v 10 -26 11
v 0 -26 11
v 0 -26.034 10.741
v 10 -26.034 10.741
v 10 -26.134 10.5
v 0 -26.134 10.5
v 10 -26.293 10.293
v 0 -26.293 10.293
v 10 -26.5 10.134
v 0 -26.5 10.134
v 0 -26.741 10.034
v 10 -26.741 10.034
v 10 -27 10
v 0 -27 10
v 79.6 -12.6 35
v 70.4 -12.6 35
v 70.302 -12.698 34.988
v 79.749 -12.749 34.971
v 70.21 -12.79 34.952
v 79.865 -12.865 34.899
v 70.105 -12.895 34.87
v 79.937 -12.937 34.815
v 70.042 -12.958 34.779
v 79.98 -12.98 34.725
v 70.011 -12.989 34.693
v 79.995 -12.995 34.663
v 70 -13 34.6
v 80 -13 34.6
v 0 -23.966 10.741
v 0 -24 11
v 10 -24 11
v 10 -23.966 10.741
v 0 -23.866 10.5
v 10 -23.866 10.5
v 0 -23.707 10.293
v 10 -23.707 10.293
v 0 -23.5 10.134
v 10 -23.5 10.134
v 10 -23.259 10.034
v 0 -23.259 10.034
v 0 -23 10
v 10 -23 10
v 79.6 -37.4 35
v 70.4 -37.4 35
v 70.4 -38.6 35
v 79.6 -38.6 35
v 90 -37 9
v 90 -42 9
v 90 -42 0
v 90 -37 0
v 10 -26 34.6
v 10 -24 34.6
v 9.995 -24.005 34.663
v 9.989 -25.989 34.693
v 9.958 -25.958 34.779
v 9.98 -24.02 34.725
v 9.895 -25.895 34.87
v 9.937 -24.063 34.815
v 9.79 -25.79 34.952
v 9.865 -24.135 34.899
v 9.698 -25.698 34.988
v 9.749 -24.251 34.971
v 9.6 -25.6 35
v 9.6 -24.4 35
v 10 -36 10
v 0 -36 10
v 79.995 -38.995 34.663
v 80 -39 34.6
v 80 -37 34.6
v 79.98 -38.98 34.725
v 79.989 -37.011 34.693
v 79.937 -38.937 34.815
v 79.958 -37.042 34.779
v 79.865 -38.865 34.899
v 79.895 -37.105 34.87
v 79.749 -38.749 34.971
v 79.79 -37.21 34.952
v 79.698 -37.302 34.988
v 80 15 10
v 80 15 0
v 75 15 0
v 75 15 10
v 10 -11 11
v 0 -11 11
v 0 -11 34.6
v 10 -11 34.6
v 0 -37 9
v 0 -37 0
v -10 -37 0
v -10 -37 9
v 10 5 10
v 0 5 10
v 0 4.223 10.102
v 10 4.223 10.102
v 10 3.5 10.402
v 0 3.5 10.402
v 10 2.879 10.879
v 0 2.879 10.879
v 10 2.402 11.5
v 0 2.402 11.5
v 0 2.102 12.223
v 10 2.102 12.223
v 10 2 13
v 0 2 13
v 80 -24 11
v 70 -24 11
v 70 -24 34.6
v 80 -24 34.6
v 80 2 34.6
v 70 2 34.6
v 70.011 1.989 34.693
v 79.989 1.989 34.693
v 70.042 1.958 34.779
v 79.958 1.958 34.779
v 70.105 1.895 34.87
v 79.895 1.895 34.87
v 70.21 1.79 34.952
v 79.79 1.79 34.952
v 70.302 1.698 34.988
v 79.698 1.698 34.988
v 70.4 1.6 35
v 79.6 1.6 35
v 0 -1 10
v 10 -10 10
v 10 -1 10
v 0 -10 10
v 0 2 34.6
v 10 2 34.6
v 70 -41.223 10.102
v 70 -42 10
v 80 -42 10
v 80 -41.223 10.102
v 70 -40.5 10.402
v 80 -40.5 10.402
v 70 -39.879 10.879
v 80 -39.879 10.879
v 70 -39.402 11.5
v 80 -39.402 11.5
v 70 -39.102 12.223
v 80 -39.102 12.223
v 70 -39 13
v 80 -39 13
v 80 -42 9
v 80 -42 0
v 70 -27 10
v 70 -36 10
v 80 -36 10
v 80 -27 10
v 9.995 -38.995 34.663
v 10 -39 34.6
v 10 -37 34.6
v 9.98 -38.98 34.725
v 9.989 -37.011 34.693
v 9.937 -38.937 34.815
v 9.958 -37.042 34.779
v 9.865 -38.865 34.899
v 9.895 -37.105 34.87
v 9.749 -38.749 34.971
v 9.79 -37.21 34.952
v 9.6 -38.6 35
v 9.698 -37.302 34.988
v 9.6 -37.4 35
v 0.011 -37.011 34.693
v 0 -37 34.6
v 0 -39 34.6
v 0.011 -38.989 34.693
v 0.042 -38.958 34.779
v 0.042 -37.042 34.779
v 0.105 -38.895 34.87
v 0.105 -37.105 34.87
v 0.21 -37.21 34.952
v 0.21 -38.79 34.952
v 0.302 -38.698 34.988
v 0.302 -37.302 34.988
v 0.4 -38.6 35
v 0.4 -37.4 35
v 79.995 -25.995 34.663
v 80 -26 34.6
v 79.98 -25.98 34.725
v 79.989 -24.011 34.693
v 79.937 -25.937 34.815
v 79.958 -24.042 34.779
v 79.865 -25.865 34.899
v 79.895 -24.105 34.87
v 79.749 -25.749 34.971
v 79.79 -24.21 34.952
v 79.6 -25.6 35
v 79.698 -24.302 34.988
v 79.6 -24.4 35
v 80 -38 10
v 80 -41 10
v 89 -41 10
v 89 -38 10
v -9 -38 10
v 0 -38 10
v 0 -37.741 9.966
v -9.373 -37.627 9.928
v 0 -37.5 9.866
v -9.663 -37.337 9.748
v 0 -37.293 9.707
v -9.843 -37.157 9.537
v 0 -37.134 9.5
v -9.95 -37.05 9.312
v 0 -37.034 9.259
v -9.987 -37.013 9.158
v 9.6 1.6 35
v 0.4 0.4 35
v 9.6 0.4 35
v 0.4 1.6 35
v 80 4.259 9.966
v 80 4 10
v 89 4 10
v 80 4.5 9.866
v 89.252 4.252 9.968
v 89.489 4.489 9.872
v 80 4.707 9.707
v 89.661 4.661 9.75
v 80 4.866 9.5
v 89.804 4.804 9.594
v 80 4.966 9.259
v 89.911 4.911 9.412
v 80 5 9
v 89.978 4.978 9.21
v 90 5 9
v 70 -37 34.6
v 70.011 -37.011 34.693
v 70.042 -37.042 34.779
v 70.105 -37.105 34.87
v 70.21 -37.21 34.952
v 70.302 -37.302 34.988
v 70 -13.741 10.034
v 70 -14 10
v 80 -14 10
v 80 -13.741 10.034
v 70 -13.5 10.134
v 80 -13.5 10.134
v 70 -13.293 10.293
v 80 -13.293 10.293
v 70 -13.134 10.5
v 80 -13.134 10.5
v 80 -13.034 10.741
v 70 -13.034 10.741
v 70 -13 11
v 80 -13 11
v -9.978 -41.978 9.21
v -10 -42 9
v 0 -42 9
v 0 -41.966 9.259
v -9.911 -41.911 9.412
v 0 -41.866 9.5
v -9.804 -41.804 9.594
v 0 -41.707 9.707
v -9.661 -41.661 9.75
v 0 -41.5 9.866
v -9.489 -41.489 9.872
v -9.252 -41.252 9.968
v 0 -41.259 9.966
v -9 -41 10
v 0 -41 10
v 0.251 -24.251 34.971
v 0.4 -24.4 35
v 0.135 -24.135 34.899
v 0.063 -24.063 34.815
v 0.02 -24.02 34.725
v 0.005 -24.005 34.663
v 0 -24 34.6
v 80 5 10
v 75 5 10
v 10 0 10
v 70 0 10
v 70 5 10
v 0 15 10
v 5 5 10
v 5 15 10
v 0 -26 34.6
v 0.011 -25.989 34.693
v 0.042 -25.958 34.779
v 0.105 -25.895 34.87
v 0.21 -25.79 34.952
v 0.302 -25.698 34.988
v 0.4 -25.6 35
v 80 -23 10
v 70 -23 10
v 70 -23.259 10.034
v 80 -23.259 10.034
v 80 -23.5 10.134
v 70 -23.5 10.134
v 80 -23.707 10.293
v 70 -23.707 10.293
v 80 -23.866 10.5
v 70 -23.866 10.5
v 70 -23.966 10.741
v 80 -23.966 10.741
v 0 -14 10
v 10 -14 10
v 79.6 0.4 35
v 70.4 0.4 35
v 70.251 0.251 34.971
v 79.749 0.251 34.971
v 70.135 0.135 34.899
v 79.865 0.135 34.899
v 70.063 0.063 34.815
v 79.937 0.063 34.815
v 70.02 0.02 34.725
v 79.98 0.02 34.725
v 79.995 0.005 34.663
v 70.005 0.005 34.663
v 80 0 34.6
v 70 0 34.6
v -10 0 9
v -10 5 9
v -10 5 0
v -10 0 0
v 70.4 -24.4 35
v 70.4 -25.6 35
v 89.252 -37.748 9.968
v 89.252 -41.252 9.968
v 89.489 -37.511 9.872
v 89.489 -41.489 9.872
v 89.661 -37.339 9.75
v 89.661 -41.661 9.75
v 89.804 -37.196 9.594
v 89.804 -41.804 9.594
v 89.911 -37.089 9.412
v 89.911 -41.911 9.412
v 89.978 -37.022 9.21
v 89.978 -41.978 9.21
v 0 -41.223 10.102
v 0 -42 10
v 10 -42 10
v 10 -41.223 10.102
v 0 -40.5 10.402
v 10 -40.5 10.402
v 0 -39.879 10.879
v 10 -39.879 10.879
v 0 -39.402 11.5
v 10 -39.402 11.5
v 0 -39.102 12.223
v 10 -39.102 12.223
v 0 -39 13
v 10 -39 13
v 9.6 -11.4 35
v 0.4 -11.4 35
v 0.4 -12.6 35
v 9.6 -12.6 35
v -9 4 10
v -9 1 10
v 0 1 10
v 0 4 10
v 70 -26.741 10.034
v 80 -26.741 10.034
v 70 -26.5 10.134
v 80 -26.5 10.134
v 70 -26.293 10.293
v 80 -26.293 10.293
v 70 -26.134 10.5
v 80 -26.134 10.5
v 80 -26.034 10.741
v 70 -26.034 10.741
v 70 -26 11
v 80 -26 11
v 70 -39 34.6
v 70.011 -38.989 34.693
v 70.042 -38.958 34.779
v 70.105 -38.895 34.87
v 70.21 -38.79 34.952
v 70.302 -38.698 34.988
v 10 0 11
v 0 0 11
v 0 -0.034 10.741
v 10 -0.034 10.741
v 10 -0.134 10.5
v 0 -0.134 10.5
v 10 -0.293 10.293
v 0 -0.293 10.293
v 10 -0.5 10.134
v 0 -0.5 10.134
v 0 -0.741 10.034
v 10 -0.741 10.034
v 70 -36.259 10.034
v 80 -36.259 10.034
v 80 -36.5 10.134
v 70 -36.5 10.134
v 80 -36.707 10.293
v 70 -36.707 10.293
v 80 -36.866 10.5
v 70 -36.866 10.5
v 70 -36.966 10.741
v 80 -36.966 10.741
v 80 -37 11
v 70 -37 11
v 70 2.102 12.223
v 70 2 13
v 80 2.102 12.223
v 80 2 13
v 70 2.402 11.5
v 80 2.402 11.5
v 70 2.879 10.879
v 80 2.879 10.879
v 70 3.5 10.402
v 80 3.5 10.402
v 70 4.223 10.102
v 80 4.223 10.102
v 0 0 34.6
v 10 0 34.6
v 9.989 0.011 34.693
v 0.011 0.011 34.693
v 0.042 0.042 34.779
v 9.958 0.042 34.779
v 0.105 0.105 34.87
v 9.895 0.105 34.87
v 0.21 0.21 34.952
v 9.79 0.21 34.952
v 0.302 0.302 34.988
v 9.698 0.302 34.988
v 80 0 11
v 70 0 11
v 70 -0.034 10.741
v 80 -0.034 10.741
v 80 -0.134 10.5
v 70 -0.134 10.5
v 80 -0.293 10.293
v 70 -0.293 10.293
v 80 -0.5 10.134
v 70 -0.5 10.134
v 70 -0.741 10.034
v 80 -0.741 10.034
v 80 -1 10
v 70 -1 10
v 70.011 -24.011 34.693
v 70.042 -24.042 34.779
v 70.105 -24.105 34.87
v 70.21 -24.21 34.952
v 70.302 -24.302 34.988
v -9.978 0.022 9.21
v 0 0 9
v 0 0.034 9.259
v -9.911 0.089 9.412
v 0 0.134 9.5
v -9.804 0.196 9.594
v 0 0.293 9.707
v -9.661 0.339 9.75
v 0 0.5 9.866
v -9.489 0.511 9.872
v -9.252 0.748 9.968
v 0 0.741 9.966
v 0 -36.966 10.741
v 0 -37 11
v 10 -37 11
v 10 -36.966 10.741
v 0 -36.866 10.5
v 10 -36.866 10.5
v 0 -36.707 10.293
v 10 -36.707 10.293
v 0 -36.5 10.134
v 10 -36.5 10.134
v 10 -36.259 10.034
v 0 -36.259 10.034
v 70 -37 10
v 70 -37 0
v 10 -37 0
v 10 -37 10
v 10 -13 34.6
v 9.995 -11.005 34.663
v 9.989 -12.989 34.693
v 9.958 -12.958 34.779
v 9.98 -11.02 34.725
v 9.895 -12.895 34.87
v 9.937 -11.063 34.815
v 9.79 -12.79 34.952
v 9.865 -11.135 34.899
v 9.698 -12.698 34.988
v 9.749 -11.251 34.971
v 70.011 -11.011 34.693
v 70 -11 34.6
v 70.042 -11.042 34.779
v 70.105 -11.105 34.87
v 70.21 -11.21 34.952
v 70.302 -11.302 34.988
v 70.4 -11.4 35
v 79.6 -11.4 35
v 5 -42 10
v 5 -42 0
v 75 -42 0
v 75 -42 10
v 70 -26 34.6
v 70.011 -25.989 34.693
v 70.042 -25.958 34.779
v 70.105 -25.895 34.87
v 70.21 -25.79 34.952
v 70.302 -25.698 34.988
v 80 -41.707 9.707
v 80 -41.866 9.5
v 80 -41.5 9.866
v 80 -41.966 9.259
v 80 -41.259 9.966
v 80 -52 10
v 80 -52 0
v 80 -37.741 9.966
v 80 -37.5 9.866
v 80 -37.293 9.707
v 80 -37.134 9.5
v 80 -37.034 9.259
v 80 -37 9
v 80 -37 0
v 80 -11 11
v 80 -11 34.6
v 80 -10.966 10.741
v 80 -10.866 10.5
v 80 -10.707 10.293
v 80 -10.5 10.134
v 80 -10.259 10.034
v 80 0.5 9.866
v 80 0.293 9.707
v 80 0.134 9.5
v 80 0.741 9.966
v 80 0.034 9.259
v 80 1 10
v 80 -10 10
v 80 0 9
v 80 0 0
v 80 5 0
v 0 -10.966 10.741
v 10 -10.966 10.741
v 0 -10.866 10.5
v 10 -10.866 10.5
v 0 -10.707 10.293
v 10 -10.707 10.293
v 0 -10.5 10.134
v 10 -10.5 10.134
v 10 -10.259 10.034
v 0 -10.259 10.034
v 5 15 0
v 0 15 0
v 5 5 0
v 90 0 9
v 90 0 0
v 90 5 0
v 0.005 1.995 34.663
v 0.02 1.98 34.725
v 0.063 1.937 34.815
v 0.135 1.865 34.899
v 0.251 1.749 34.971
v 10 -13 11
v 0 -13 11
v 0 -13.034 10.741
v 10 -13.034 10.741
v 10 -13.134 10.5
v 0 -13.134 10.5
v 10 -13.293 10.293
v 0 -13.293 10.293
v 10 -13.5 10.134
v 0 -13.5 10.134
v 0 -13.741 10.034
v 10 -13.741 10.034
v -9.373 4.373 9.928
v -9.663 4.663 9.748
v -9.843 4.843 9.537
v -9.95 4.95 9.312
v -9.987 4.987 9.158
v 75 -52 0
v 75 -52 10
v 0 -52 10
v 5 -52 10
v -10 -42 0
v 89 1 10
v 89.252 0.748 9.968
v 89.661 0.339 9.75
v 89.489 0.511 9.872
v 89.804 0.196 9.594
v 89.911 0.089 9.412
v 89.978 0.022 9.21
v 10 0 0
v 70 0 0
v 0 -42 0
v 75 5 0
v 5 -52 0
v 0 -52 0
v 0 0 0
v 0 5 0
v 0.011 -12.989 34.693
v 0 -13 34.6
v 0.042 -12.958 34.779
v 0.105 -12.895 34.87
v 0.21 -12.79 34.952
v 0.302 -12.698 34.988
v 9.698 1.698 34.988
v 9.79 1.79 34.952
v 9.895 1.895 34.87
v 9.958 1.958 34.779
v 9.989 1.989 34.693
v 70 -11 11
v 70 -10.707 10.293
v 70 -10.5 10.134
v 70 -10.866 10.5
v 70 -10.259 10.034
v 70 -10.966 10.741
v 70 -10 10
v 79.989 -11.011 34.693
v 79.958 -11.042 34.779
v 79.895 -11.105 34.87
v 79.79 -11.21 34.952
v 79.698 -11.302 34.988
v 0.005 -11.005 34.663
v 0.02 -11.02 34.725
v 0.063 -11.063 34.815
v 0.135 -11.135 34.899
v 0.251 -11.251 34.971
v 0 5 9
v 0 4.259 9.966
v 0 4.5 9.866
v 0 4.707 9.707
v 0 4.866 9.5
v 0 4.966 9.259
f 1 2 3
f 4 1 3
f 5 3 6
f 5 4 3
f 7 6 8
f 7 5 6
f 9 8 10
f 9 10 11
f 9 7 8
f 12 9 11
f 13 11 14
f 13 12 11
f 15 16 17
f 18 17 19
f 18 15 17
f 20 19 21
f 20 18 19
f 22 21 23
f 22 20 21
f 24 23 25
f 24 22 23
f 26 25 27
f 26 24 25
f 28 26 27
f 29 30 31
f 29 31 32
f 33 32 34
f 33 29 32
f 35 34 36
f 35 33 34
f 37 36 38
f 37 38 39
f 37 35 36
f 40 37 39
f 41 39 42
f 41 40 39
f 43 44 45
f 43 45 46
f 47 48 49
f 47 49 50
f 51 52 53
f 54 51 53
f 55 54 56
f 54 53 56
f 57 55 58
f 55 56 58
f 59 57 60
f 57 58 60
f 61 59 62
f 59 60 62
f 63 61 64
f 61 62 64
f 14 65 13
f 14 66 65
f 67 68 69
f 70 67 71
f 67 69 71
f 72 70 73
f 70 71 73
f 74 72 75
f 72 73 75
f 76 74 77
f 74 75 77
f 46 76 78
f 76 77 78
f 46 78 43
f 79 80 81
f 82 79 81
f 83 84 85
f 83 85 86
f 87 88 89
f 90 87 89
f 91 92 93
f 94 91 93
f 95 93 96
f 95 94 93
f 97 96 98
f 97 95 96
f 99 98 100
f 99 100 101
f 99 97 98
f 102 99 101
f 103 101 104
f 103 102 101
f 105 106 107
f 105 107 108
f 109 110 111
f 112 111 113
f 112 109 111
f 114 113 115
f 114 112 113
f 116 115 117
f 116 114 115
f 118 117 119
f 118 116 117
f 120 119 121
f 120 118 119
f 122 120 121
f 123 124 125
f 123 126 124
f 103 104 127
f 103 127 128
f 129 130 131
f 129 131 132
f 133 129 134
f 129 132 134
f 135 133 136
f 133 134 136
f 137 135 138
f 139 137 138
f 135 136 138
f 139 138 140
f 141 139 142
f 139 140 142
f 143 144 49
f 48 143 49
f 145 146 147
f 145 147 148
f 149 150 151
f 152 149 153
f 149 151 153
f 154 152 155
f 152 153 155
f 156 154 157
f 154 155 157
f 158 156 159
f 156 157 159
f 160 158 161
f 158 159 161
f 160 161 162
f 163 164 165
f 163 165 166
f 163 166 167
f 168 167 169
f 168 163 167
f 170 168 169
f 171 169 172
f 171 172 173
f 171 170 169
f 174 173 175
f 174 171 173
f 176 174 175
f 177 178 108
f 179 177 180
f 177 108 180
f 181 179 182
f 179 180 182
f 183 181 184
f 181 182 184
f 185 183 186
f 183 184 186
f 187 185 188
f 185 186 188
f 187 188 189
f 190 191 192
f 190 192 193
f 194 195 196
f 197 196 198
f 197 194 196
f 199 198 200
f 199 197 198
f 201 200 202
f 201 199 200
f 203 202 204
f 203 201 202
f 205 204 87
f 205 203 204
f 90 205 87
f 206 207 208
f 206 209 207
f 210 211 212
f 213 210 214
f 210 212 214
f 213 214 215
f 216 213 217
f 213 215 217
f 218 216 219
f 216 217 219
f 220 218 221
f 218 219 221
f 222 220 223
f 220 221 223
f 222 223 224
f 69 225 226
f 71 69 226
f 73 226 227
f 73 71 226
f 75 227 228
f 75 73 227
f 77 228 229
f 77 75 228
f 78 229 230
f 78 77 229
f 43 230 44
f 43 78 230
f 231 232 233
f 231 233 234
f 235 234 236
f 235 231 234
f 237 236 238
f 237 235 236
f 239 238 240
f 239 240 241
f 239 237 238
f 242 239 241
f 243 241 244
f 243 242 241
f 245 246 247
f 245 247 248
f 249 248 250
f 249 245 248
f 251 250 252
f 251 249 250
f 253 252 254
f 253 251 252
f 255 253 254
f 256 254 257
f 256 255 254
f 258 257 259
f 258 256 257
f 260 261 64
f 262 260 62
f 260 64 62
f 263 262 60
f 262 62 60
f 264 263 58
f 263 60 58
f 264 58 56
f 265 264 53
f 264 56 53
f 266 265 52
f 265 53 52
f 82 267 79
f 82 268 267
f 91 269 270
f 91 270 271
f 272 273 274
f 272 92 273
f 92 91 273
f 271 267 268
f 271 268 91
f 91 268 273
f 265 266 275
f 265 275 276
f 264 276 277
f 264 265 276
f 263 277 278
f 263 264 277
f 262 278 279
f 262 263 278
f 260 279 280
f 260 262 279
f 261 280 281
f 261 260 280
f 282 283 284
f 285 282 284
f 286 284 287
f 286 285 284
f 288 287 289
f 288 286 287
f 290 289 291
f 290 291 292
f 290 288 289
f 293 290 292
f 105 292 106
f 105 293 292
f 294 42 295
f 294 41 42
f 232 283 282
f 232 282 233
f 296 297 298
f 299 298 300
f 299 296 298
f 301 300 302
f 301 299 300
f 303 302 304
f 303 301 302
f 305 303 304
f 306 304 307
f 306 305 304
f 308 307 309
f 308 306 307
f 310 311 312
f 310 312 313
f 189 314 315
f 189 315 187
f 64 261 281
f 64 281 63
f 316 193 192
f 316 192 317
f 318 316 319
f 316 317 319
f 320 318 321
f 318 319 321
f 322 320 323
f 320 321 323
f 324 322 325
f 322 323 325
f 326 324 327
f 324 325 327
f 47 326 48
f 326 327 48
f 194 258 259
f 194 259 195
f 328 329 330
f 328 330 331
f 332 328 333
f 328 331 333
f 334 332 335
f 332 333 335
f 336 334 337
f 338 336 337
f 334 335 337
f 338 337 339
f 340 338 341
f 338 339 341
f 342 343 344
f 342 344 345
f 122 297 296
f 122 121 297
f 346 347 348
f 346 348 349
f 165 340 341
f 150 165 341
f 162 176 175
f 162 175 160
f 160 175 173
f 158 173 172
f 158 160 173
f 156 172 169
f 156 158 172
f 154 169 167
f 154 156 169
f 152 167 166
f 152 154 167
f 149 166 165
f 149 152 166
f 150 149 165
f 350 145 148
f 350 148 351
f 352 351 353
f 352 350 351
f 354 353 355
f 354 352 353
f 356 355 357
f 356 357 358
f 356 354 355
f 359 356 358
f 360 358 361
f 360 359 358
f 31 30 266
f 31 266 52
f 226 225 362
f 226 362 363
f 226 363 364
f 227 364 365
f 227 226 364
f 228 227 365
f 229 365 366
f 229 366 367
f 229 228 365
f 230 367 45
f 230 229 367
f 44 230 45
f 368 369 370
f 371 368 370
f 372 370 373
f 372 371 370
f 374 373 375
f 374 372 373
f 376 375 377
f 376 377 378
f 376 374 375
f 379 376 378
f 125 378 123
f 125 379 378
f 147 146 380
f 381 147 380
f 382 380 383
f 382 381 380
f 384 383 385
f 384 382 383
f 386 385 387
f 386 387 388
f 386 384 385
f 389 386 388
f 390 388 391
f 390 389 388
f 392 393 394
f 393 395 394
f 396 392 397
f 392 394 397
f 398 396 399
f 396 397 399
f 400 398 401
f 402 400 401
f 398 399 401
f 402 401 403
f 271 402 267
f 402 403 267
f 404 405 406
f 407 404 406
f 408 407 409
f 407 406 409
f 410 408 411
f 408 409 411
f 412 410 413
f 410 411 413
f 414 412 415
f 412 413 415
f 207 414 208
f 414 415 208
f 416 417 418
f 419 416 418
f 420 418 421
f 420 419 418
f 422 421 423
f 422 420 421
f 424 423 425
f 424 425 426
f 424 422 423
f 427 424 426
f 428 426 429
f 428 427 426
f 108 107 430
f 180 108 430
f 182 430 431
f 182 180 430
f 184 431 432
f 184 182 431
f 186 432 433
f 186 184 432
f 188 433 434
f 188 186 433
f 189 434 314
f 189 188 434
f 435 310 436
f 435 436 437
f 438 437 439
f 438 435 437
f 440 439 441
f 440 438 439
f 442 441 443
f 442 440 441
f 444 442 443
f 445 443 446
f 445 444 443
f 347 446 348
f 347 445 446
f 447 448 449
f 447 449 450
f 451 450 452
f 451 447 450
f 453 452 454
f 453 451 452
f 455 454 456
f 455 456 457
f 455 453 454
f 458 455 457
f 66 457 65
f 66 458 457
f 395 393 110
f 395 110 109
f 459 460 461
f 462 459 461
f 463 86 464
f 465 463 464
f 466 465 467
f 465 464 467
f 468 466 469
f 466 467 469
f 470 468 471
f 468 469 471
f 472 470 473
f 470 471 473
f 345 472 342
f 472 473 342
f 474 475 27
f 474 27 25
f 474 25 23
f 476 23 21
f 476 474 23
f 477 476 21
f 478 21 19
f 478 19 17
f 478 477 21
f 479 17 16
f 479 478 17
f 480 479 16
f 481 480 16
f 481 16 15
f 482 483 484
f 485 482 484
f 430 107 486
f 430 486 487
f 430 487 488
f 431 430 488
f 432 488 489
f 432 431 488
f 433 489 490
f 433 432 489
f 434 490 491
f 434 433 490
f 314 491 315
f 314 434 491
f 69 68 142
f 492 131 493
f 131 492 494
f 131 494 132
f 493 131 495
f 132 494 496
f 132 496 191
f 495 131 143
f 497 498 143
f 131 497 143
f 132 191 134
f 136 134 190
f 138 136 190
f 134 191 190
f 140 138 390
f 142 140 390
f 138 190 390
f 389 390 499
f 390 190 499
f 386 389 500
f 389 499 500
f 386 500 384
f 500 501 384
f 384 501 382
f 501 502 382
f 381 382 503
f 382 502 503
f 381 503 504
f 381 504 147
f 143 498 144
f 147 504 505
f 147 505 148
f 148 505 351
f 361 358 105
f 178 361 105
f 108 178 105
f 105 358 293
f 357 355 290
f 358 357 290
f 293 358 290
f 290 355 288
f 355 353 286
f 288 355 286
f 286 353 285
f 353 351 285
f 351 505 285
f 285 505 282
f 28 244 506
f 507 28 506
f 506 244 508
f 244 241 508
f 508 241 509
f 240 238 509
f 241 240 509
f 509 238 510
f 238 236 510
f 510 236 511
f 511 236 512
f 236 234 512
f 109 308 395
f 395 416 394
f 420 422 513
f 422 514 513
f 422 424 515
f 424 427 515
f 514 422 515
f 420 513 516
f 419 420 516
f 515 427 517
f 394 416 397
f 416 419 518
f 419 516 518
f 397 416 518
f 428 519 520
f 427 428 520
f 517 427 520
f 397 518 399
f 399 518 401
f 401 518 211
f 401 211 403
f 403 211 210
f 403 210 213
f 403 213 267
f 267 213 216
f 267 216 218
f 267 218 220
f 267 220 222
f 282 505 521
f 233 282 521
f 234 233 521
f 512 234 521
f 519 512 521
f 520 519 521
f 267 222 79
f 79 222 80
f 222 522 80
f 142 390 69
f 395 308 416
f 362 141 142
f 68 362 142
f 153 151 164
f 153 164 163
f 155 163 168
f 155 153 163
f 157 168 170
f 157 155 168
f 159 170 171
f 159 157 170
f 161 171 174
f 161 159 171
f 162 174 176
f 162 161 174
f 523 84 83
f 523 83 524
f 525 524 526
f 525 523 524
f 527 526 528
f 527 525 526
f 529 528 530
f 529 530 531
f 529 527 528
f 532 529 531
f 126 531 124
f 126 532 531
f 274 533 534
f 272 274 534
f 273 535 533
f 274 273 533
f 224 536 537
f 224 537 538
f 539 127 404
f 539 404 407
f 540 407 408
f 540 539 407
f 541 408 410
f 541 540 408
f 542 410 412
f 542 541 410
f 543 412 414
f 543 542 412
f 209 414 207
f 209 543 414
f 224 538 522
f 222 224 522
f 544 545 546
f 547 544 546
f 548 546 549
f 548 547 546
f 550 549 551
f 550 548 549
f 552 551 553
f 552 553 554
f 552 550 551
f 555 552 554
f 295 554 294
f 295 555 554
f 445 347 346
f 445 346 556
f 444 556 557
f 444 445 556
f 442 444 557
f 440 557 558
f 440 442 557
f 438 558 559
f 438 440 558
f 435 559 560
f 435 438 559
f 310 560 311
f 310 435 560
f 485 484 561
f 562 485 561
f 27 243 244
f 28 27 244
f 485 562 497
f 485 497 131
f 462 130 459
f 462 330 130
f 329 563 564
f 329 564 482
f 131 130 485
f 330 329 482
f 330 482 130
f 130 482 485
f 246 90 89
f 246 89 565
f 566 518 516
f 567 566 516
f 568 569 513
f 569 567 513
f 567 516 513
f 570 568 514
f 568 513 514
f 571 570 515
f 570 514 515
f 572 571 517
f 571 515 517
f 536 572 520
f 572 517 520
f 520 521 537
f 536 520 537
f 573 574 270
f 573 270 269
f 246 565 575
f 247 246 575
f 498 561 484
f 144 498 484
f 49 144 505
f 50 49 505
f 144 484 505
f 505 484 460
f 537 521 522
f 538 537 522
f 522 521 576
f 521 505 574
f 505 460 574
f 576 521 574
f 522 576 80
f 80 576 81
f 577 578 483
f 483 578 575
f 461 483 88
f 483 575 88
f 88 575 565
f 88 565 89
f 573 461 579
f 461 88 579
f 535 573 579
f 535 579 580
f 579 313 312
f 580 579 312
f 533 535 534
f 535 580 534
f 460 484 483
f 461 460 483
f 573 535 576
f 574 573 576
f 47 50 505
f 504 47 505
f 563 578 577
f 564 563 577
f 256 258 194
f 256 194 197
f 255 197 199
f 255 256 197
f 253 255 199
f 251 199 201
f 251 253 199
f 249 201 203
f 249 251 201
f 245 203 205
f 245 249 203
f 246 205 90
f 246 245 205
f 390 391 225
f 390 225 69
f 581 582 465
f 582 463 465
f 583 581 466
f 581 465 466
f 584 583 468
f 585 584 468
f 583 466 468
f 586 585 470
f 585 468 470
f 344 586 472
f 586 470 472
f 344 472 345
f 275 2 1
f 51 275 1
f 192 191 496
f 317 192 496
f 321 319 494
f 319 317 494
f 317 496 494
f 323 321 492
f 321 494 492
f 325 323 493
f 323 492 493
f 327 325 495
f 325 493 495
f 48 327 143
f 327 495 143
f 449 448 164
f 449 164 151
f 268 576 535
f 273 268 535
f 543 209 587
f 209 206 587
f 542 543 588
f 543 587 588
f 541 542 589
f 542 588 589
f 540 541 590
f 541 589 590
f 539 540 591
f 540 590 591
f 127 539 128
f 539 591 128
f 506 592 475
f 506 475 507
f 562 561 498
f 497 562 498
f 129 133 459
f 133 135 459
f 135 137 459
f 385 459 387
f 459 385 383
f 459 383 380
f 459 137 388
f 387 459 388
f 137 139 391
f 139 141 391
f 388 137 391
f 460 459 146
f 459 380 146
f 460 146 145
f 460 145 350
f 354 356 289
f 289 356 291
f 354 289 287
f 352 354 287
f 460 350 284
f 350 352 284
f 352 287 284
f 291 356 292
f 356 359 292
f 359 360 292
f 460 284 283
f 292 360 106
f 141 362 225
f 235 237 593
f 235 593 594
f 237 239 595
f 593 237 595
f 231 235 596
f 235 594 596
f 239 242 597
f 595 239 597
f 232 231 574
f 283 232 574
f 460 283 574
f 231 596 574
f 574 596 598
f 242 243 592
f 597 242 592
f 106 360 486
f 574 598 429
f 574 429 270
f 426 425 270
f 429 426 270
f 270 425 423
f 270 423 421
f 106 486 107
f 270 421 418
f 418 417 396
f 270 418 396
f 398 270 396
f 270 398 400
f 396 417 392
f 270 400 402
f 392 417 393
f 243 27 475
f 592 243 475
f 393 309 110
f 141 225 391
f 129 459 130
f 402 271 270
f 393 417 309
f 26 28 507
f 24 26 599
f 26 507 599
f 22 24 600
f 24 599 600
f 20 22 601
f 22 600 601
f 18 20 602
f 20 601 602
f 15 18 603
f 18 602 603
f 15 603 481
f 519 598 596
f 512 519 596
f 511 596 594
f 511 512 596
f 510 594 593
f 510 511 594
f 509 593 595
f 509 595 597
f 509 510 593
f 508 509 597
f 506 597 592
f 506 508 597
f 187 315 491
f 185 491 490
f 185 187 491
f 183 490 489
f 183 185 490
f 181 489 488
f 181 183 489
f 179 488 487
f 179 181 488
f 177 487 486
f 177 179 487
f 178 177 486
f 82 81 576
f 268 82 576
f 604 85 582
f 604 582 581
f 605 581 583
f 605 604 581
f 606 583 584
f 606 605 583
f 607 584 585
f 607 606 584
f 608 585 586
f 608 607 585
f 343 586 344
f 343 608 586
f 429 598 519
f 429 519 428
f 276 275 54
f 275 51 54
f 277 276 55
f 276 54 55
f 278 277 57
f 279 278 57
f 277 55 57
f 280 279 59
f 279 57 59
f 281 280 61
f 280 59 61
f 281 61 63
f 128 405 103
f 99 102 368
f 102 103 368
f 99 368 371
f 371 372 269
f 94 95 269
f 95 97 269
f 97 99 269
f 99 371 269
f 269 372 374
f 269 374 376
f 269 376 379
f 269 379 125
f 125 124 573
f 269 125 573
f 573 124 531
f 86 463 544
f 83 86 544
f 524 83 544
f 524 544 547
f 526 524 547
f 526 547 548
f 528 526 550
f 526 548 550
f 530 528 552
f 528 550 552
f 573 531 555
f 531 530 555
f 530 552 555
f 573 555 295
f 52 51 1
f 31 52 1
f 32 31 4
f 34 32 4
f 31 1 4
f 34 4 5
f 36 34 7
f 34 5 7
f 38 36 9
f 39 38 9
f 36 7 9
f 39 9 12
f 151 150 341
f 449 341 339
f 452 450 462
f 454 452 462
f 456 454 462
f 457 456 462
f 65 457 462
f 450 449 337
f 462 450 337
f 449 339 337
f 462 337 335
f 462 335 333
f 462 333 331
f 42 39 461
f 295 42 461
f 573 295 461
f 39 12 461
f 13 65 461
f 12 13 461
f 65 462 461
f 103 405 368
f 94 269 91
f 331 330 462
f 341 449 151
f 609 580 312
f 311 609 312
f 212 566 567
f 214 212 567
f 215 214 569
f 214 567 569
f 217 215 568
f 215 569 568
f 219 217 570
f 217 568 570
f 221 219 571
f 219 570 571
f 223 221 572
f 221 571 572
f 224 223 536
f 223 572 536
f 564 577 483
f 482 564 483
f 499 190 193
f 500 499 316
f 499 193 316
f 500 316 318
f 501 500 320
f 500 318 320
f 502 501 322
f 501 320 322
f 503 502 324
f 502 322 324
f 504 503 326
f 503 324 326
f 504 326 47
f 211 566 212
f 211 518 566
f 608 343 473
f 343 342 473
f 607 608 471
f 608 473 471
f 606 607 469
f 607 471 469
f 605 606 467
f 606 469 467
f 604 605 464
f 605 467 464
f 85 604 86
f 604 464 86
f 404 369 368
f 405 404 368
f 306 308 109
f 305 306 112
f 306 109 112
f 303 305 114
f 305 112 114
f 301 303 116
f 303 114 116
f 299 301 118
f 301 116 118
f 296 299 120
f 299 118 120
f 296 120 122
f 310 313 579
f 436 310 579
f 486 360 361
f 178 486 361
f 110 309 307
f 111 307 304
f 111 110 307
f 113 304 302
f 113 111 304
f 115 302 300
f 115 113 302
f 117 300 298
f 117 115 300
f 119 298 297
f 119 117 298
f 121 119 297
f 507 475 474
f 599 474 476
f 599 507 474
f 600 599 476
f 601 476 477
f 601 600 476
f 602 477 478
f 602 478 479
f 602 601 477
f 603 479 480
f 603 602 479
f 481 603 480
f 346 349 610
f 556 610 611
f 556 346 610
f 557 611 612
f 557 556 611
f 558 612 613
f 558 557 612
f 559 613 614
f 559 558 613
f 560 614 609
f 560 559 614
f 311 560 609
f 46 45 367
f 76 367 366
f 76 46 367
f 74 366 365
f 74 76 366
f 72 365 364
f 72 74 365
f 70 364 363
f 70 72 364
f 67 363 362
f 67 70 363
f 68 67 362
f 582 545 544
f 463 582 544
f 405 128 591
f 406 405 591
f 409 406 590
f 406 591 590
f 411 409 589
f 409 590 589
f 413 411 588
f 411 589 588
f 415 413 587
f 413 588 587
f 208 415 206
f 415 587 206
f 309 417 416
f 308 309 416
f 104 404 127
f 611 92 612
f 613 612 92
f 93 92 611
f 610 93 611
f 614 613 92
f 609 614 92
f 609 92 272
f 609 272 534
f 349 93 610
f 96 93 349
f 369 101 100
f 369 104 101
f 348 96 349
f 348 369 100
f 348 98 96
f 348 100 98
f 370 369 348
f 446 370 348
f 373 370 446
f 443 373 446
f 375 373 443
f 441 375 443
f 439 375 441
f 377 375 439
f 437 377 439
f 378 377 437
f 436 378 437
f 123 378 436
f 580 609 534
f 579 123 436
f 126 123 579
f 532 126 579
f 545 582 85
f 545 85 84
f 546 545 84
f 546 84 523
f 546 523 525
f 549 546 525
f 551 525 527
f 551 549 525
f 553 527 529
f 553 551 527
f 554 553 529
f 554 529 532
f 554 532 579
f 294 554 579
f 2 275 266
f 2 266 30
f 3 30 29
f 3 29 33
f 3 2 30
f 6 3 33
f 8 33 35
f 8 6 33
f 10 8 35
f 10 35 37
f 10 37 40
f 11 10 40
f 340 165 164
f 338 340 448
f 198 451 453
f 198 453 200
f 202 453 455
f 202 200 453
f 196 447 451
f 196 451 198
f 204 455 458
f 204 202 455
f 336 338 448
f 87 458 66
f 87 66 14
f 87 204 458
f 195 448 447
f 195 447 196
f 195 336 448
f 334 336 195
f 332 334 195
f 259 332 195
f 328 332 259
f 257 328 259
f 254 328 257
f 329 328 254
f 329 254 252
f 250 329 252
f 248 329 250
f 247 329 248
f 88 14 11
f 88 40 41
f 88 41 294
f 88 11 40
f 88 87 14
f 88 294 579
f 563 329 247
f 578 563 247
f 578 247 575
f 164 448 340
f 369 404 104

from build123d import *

# Parameters (mm, degrees)
SKETCH2_W           = 37
SKETCH2_H           = 60
BOSS_EXTRUDE1_DEPTH = 10
SKETCH3_W           = 10
SKETCH3_H           = 2
BOSS_EXTRUDE2_DEPTH = 25
FILLET1_R           = 3
FILLET2_R           = 3
FILLET3_R           = 1
FILLET6_START       = -11
FILLET6_DEPTH       = 11
FILLET6_START_2     = -43
FILLET6_2_DEPTH     = 7
FILLET6_3_DEPTH     = 11
FILLET7_START       = -11
FILLET7_DEPTH       = 11
FILLET7_START_2     = -1
FILLET7_2_DEPTH     = 7
FILLET8_R           = 1
FILLET9_R           = 1
FILLET10_R          = 0.4


with BuildPart() as part:
    # Sketch2 → Boss-Extrude1 (new body)
    with BuildSketch(Plane(origin=(0, 0, 0), x_dir=(0, 1, 0), z_dir=(0, 0, 1))):
        Polygon((-42, 10), (-42, 0), (-52, 0), (-52, -5), (-42, -5), (-42, -75), (-52, -75), (-52, -80), (-42, -80), (-42, -90), (-37, -90), (-37, -80), (0, -80), (0, -90), (5, -90), (5, -80), (15, -80), (15, -75), (5, -75), (5, -5), (15, -5), (15, 0), (5, 0), (5, 10), (0, 10), (0, 0), (-37, 0), (-37, 10), align=None)
        with Locations((-18.5, -40)):
            Rectangle(SKETCH2_W, SKETCH2_H, mode=Mode.SUBTRACT)
    extrude(amount=BOSS_EXTRUDE1_DEPTH)

    # Sketch3 → Boss-Extrude2 (add)
    with BuildSketch(Plane.XY.offset(10)):
        with Locations((5, 1)):
            Rectangle(SKETCH3_W, SKETCH3_H)
        with Locations((5, -12)):
            Rectangle(SKETCH3_W, SKETCH3_H)
        with Locations((5, -25)):
            Rectangle(SKETCH3_W, SKETCH3_H)
        with Locations((5, -38)):
            Rectangle(SKETCH3_W, SKETCH3_H)
        with Locations((75, 1)):
            Rectangle(SKETCH3_W, SKETCH3_H)
        with Locations((75, -12)):
            Rectangle(SKETCH3_W, SKETCH3_H)
        with Locations((75, -25)):
            Rectangle(SKETCH3_W, SKETCH3_H)
        with Locations((75, -38)):
            Rectangle(SKETCH3_W, SKETCH3_H)
    extrude(amount=BOSS_EXTRUDE2_DEPTH)

    # Fillet1
    fillet1_edges = [part.edges().sort_by_distance(p)[0] for p in [
        (5, -39, 10),
        (75, -39, 10),
    ]]
    fillet(fillet1_edges, radius=FILLET1_R - 0.0001)  # a hair under: the kernel refuses the full size

    # Fillet2
    fillet2_edges = [part.edges().sort_by_distance(p)[0] for p in [
        (75, 2, 10),
        (5, 2, 10),
    ]]
    fillet(fillet2_edges, radius=FILLET2_R - 0.0001)  # a hair under: the kernel refuses the full size

    # Fillet3
    # the kernel refuses this fillet: 1 mm, written as the material it adds along each edge
    with BuildSketch(Plane(origin=(80, 0, 10), x_dir=(0, -1, 0), z_dir=(-1, 0, 0)), Plane(origin=(10, -26, 10), x_dir=(0, -1, 0), z_dir=(-1, 0, 0)), Plane(origin=(10, -13, 10), x_dir=(0, -1, 0), z_dir=(-1, 0, 0)), Plane(origin=(80, -11, 10), x_dir=(0, 0, 1), z_dir=(-1, 0, 0)), Plane(origin=(80, -24, 10), x_dir=(0, 0, 1), z_dir=(-1, 0, 0)), Plane(origin=(80, -37, 10), x_dir=(0, 0, 1), z_dir=(-1, 0, 0)), Plane(origin=(10, 0, 10), x_dir=(0, -1, 0), z_dir=(-1, 0, 0))) as fillet3_piece_1:
        with BuildLine():
            CenterArc((FILLET3_R, FILLET3_R), FILLET3_R, 180, 90)
            Line((0, FILLET3_R), (0, 0))
            Line((0, 0), (FILLET3_R, 0))
        make_face()
    extrude(amount=10)
    with BuildSketch(Plane(origin=(0, -37, 10), x_dir=(0, 0, 1), z_dir=(1, 0, 0)), Plane(origin=(0, -24, 10), x_dir=(0, 0, 1), z_dir=(1, 0, 0)), Plane(origin=(0, -11, 10), x_dir=(0, 0, 1), z_dir=(1, 0, 0)), Plane(origin=(70, -13, 10), x_dir=(0, -1, 0), z_dir=(1, 0, 0)), Plane(origin=(70, -26, 10), x_dir=(0, -1, 0), z_dir=(1, 0, 0))) as fillet3_piece_2:
        with BuildLine():
            CenterArc((FILLET3_R, -FILLET3_R), FILLET3_R, 90, 90)
            Line((0, -FILLET3_R), (0, 0))
            Line((0, 0), (FILLET3_R, 0))
        make_face()
    extrude(amount=10)

    # Fillet6: read off the stored shape, not the designer's step
    # Fillet6 outline → Fillet6 (cut)
    with BuildSketch(Plane.YZ.offset(FILLET6_START)):
        with BuildLine():
            Line((-42, 10), (-42, 9))
            ThreePointArc((-42, 9), (-41.707106781, 9.707106781), (-41, 10))
            Line((-41, 10), (-42, 10))
        make_face()
    extrude(amount=FILLET6_DEPTH, mode=Mode.SUBTRACT)

    # Fillet6 2 outline → Fillet6 2 (cut)
    with BuildSketch(Plane(origin=(0, 0, 0), x_dir=(1, 0, 0), z_dir=(0, 1, 0)).offset(FILLET6_START_2)):
        with BuildLine():
            ThreePointArc((-9, -10), (-9.707106781, -9.707106781), (-10, -9))
            Line((-10, -9), (-10, -10))
            Line((-10, -10), (-9, -10))
        make_face()
    extrude(amount=FILLET6_2_DEPTH, mode=Mode.SUBTRACT)

    # Fillet6 3 outline → Fillet6 3 (cut)
    with BuildSketch(Plane.YZ.offset(FILLET6_START)):
        with BuildLine():
            ThreePointArc((-38, 10), (-37.292893219, 9.707106781), (-37, 9))
            Line((-37, 9), (-37, 10))
            Line((-37, 10), (-38, 10))
        make_face()
    extrude(amount=FILLET6_3_DEPTH, mode=Mode.SUBTRACT)

    # Fillet7: read off the stored shape, not the designer's step
    # Fillet7 outline → Fillet7 (cut)
    with BuildSketch(Plane.YZ.offset(FILLET7_START)):
        with BuildLine():
            Line((0, 10), (0, 9))
            ThreePointArc((0, 9), (0.292893219, 9.707106781), (1, 10))
            Line((1, 10), (0, 10))
        make_face()
        with BuildLine():
            Line((5, 10), (4, 10))
            ThreePointArc((4, 10), (4.707106781, 9.707106781), (5, 9))
            Line((5, 9), (5, 10))
        make_face()
    extrude(amount=FILLET7_DEPTH, mode=Mode.SUBTRACT)

    # Fillet7 2 outline → Fillet7 2 (cut)
    with BuildSketch(Plane(origin=(0, 0, 0), x_dir=(1, 0, 0), z_dir=(0, 1, 0)).offset(FILLET7_START_2)):
        with BuildLine():
            ThreePointArc((-9, -10), (-9.707106781, -9.707106781), (-10, -9))
            Line((-10, -9), (-10, -10))
            Line((-10, -10), (-9, -10))
        make_face()
    extrude(amount=FILLET7_2_DEPTH, mode=Mode.SUBTRACT)

    # Fillet8
    # the kernel refuses this fillet: 1 mm, written as the material it takes off along each edge
    with BuildSketch(Plane(origin=(80, 0, 10), x_dir=(0, 1, 0), z_dir=(1, 0, 0)), Plane(origin=(92.5, 5, 10), x_dir=(0, -1, 0), z_dir=(-1, 0, 0))) as fillet8_piece_1:
        with BuildLine():
            CenterArc((FILLET8_R, -FILLET8_R), FILLET8_R, 90, 90)
            Line((0, -FILLET8_R), (0, 0))
            Line((0, 0), (FILLET8_R, 0))
        make_face()
    extrude(amount=12.5, mode=Mode.SUBTRACT)
    with BuildSketch(Plane(origin=(90, -2.5, 10), x_dir=(-1, 0, 0), z_dir=(0, 1, 0))) as fillet8_piece_2:
        with BuildLine():
            CenterArc((FILLET8_R, -FILLET8_R), FILLET8_R, 90, 90)
            Line((0, -FILLET8_R), (0, 0))
            Line((0, 0), (FILLET8_R, 0))
        make_face()
    extrude(amount=10, mode=Mode.SUBTRACT)

    # Fillet9
    # the kernel refuses this fillet: 1 mm, written as the material it takes off along each edge
    with BuildSketch(Plane(origin=(80, -42, 10), x_dir=(0, 1, 0), z_dir=(1, 0, 0)), Plane(origin=(92.5, -37, 10), x_dir=(0, -1, 0), z_dir=(-1, 0, 0))) as fillet9_piece_1:
        with BuildLine():
            CenterArc((FILLET9_R, -FILLET9_R), FILLET9_R, 90, 90)
            Line((0, -FILLET9_R), (0, 0))
            Line((0, 0), (FILLET9_R, 0))
        make_face()
    extrude(amount=12.5, mode=Mode.SUBTRACT)
    with BuildSketch(Plane(origin=(90, -44.5, 10), x_dir=(-1, 0, 0), z_dir=(0, 1, 0))) as fillet9_piece_2:
        with BuildLine():
            CenterArc((FILLET9_R, -FILLET9_R), FILLET9_R, 90, 90)
            Line((0, -FILLET9_R), (0, 0))
            Line((0, 0), (FILLET9_R, 0))
        make_face()
    extrude(amount=10, mode=Mode.SUBTRACT)

    # Fillet10
    fillet10_edges = [part.edges().sort_by_distance(p)[0] for p in [
        (75, 0, 35),
        (80, 1, 35),
        (75, 2, 35),
        (70, 1, 35),
        (5, -37, 35),
        (0, -38, 35),
        (5, -39, 35),
        (10, -38, 35),
        (5, -24, 35),
        (0, -25, 35),
        (5, -26, 35),
        (10, -25, 35),
        (5, -11, 35),
        (0, -12, 35),
        (5, -13, 35),
        (10, -12, 35),
        (75, -11, 35),
        (70, -12, 35),
        (75, -13, 35),
        (80, -12, 35),
        (75, -24, 35),
        (70, -25, 35),
        (75, -26, 35),
        (80, -25, 35),
        (75, -37, 35),
        (70, -38, 35),
        (75, -39, 35),
        (80, -38, 35),
        (5, 0, 35),
        (10, 1, 35),
        (5, 2, 35),
        (0, 1, 35),
    ]]
    fillet(fillet10_edges, radius=FILLET10_R)


solid = part.part
